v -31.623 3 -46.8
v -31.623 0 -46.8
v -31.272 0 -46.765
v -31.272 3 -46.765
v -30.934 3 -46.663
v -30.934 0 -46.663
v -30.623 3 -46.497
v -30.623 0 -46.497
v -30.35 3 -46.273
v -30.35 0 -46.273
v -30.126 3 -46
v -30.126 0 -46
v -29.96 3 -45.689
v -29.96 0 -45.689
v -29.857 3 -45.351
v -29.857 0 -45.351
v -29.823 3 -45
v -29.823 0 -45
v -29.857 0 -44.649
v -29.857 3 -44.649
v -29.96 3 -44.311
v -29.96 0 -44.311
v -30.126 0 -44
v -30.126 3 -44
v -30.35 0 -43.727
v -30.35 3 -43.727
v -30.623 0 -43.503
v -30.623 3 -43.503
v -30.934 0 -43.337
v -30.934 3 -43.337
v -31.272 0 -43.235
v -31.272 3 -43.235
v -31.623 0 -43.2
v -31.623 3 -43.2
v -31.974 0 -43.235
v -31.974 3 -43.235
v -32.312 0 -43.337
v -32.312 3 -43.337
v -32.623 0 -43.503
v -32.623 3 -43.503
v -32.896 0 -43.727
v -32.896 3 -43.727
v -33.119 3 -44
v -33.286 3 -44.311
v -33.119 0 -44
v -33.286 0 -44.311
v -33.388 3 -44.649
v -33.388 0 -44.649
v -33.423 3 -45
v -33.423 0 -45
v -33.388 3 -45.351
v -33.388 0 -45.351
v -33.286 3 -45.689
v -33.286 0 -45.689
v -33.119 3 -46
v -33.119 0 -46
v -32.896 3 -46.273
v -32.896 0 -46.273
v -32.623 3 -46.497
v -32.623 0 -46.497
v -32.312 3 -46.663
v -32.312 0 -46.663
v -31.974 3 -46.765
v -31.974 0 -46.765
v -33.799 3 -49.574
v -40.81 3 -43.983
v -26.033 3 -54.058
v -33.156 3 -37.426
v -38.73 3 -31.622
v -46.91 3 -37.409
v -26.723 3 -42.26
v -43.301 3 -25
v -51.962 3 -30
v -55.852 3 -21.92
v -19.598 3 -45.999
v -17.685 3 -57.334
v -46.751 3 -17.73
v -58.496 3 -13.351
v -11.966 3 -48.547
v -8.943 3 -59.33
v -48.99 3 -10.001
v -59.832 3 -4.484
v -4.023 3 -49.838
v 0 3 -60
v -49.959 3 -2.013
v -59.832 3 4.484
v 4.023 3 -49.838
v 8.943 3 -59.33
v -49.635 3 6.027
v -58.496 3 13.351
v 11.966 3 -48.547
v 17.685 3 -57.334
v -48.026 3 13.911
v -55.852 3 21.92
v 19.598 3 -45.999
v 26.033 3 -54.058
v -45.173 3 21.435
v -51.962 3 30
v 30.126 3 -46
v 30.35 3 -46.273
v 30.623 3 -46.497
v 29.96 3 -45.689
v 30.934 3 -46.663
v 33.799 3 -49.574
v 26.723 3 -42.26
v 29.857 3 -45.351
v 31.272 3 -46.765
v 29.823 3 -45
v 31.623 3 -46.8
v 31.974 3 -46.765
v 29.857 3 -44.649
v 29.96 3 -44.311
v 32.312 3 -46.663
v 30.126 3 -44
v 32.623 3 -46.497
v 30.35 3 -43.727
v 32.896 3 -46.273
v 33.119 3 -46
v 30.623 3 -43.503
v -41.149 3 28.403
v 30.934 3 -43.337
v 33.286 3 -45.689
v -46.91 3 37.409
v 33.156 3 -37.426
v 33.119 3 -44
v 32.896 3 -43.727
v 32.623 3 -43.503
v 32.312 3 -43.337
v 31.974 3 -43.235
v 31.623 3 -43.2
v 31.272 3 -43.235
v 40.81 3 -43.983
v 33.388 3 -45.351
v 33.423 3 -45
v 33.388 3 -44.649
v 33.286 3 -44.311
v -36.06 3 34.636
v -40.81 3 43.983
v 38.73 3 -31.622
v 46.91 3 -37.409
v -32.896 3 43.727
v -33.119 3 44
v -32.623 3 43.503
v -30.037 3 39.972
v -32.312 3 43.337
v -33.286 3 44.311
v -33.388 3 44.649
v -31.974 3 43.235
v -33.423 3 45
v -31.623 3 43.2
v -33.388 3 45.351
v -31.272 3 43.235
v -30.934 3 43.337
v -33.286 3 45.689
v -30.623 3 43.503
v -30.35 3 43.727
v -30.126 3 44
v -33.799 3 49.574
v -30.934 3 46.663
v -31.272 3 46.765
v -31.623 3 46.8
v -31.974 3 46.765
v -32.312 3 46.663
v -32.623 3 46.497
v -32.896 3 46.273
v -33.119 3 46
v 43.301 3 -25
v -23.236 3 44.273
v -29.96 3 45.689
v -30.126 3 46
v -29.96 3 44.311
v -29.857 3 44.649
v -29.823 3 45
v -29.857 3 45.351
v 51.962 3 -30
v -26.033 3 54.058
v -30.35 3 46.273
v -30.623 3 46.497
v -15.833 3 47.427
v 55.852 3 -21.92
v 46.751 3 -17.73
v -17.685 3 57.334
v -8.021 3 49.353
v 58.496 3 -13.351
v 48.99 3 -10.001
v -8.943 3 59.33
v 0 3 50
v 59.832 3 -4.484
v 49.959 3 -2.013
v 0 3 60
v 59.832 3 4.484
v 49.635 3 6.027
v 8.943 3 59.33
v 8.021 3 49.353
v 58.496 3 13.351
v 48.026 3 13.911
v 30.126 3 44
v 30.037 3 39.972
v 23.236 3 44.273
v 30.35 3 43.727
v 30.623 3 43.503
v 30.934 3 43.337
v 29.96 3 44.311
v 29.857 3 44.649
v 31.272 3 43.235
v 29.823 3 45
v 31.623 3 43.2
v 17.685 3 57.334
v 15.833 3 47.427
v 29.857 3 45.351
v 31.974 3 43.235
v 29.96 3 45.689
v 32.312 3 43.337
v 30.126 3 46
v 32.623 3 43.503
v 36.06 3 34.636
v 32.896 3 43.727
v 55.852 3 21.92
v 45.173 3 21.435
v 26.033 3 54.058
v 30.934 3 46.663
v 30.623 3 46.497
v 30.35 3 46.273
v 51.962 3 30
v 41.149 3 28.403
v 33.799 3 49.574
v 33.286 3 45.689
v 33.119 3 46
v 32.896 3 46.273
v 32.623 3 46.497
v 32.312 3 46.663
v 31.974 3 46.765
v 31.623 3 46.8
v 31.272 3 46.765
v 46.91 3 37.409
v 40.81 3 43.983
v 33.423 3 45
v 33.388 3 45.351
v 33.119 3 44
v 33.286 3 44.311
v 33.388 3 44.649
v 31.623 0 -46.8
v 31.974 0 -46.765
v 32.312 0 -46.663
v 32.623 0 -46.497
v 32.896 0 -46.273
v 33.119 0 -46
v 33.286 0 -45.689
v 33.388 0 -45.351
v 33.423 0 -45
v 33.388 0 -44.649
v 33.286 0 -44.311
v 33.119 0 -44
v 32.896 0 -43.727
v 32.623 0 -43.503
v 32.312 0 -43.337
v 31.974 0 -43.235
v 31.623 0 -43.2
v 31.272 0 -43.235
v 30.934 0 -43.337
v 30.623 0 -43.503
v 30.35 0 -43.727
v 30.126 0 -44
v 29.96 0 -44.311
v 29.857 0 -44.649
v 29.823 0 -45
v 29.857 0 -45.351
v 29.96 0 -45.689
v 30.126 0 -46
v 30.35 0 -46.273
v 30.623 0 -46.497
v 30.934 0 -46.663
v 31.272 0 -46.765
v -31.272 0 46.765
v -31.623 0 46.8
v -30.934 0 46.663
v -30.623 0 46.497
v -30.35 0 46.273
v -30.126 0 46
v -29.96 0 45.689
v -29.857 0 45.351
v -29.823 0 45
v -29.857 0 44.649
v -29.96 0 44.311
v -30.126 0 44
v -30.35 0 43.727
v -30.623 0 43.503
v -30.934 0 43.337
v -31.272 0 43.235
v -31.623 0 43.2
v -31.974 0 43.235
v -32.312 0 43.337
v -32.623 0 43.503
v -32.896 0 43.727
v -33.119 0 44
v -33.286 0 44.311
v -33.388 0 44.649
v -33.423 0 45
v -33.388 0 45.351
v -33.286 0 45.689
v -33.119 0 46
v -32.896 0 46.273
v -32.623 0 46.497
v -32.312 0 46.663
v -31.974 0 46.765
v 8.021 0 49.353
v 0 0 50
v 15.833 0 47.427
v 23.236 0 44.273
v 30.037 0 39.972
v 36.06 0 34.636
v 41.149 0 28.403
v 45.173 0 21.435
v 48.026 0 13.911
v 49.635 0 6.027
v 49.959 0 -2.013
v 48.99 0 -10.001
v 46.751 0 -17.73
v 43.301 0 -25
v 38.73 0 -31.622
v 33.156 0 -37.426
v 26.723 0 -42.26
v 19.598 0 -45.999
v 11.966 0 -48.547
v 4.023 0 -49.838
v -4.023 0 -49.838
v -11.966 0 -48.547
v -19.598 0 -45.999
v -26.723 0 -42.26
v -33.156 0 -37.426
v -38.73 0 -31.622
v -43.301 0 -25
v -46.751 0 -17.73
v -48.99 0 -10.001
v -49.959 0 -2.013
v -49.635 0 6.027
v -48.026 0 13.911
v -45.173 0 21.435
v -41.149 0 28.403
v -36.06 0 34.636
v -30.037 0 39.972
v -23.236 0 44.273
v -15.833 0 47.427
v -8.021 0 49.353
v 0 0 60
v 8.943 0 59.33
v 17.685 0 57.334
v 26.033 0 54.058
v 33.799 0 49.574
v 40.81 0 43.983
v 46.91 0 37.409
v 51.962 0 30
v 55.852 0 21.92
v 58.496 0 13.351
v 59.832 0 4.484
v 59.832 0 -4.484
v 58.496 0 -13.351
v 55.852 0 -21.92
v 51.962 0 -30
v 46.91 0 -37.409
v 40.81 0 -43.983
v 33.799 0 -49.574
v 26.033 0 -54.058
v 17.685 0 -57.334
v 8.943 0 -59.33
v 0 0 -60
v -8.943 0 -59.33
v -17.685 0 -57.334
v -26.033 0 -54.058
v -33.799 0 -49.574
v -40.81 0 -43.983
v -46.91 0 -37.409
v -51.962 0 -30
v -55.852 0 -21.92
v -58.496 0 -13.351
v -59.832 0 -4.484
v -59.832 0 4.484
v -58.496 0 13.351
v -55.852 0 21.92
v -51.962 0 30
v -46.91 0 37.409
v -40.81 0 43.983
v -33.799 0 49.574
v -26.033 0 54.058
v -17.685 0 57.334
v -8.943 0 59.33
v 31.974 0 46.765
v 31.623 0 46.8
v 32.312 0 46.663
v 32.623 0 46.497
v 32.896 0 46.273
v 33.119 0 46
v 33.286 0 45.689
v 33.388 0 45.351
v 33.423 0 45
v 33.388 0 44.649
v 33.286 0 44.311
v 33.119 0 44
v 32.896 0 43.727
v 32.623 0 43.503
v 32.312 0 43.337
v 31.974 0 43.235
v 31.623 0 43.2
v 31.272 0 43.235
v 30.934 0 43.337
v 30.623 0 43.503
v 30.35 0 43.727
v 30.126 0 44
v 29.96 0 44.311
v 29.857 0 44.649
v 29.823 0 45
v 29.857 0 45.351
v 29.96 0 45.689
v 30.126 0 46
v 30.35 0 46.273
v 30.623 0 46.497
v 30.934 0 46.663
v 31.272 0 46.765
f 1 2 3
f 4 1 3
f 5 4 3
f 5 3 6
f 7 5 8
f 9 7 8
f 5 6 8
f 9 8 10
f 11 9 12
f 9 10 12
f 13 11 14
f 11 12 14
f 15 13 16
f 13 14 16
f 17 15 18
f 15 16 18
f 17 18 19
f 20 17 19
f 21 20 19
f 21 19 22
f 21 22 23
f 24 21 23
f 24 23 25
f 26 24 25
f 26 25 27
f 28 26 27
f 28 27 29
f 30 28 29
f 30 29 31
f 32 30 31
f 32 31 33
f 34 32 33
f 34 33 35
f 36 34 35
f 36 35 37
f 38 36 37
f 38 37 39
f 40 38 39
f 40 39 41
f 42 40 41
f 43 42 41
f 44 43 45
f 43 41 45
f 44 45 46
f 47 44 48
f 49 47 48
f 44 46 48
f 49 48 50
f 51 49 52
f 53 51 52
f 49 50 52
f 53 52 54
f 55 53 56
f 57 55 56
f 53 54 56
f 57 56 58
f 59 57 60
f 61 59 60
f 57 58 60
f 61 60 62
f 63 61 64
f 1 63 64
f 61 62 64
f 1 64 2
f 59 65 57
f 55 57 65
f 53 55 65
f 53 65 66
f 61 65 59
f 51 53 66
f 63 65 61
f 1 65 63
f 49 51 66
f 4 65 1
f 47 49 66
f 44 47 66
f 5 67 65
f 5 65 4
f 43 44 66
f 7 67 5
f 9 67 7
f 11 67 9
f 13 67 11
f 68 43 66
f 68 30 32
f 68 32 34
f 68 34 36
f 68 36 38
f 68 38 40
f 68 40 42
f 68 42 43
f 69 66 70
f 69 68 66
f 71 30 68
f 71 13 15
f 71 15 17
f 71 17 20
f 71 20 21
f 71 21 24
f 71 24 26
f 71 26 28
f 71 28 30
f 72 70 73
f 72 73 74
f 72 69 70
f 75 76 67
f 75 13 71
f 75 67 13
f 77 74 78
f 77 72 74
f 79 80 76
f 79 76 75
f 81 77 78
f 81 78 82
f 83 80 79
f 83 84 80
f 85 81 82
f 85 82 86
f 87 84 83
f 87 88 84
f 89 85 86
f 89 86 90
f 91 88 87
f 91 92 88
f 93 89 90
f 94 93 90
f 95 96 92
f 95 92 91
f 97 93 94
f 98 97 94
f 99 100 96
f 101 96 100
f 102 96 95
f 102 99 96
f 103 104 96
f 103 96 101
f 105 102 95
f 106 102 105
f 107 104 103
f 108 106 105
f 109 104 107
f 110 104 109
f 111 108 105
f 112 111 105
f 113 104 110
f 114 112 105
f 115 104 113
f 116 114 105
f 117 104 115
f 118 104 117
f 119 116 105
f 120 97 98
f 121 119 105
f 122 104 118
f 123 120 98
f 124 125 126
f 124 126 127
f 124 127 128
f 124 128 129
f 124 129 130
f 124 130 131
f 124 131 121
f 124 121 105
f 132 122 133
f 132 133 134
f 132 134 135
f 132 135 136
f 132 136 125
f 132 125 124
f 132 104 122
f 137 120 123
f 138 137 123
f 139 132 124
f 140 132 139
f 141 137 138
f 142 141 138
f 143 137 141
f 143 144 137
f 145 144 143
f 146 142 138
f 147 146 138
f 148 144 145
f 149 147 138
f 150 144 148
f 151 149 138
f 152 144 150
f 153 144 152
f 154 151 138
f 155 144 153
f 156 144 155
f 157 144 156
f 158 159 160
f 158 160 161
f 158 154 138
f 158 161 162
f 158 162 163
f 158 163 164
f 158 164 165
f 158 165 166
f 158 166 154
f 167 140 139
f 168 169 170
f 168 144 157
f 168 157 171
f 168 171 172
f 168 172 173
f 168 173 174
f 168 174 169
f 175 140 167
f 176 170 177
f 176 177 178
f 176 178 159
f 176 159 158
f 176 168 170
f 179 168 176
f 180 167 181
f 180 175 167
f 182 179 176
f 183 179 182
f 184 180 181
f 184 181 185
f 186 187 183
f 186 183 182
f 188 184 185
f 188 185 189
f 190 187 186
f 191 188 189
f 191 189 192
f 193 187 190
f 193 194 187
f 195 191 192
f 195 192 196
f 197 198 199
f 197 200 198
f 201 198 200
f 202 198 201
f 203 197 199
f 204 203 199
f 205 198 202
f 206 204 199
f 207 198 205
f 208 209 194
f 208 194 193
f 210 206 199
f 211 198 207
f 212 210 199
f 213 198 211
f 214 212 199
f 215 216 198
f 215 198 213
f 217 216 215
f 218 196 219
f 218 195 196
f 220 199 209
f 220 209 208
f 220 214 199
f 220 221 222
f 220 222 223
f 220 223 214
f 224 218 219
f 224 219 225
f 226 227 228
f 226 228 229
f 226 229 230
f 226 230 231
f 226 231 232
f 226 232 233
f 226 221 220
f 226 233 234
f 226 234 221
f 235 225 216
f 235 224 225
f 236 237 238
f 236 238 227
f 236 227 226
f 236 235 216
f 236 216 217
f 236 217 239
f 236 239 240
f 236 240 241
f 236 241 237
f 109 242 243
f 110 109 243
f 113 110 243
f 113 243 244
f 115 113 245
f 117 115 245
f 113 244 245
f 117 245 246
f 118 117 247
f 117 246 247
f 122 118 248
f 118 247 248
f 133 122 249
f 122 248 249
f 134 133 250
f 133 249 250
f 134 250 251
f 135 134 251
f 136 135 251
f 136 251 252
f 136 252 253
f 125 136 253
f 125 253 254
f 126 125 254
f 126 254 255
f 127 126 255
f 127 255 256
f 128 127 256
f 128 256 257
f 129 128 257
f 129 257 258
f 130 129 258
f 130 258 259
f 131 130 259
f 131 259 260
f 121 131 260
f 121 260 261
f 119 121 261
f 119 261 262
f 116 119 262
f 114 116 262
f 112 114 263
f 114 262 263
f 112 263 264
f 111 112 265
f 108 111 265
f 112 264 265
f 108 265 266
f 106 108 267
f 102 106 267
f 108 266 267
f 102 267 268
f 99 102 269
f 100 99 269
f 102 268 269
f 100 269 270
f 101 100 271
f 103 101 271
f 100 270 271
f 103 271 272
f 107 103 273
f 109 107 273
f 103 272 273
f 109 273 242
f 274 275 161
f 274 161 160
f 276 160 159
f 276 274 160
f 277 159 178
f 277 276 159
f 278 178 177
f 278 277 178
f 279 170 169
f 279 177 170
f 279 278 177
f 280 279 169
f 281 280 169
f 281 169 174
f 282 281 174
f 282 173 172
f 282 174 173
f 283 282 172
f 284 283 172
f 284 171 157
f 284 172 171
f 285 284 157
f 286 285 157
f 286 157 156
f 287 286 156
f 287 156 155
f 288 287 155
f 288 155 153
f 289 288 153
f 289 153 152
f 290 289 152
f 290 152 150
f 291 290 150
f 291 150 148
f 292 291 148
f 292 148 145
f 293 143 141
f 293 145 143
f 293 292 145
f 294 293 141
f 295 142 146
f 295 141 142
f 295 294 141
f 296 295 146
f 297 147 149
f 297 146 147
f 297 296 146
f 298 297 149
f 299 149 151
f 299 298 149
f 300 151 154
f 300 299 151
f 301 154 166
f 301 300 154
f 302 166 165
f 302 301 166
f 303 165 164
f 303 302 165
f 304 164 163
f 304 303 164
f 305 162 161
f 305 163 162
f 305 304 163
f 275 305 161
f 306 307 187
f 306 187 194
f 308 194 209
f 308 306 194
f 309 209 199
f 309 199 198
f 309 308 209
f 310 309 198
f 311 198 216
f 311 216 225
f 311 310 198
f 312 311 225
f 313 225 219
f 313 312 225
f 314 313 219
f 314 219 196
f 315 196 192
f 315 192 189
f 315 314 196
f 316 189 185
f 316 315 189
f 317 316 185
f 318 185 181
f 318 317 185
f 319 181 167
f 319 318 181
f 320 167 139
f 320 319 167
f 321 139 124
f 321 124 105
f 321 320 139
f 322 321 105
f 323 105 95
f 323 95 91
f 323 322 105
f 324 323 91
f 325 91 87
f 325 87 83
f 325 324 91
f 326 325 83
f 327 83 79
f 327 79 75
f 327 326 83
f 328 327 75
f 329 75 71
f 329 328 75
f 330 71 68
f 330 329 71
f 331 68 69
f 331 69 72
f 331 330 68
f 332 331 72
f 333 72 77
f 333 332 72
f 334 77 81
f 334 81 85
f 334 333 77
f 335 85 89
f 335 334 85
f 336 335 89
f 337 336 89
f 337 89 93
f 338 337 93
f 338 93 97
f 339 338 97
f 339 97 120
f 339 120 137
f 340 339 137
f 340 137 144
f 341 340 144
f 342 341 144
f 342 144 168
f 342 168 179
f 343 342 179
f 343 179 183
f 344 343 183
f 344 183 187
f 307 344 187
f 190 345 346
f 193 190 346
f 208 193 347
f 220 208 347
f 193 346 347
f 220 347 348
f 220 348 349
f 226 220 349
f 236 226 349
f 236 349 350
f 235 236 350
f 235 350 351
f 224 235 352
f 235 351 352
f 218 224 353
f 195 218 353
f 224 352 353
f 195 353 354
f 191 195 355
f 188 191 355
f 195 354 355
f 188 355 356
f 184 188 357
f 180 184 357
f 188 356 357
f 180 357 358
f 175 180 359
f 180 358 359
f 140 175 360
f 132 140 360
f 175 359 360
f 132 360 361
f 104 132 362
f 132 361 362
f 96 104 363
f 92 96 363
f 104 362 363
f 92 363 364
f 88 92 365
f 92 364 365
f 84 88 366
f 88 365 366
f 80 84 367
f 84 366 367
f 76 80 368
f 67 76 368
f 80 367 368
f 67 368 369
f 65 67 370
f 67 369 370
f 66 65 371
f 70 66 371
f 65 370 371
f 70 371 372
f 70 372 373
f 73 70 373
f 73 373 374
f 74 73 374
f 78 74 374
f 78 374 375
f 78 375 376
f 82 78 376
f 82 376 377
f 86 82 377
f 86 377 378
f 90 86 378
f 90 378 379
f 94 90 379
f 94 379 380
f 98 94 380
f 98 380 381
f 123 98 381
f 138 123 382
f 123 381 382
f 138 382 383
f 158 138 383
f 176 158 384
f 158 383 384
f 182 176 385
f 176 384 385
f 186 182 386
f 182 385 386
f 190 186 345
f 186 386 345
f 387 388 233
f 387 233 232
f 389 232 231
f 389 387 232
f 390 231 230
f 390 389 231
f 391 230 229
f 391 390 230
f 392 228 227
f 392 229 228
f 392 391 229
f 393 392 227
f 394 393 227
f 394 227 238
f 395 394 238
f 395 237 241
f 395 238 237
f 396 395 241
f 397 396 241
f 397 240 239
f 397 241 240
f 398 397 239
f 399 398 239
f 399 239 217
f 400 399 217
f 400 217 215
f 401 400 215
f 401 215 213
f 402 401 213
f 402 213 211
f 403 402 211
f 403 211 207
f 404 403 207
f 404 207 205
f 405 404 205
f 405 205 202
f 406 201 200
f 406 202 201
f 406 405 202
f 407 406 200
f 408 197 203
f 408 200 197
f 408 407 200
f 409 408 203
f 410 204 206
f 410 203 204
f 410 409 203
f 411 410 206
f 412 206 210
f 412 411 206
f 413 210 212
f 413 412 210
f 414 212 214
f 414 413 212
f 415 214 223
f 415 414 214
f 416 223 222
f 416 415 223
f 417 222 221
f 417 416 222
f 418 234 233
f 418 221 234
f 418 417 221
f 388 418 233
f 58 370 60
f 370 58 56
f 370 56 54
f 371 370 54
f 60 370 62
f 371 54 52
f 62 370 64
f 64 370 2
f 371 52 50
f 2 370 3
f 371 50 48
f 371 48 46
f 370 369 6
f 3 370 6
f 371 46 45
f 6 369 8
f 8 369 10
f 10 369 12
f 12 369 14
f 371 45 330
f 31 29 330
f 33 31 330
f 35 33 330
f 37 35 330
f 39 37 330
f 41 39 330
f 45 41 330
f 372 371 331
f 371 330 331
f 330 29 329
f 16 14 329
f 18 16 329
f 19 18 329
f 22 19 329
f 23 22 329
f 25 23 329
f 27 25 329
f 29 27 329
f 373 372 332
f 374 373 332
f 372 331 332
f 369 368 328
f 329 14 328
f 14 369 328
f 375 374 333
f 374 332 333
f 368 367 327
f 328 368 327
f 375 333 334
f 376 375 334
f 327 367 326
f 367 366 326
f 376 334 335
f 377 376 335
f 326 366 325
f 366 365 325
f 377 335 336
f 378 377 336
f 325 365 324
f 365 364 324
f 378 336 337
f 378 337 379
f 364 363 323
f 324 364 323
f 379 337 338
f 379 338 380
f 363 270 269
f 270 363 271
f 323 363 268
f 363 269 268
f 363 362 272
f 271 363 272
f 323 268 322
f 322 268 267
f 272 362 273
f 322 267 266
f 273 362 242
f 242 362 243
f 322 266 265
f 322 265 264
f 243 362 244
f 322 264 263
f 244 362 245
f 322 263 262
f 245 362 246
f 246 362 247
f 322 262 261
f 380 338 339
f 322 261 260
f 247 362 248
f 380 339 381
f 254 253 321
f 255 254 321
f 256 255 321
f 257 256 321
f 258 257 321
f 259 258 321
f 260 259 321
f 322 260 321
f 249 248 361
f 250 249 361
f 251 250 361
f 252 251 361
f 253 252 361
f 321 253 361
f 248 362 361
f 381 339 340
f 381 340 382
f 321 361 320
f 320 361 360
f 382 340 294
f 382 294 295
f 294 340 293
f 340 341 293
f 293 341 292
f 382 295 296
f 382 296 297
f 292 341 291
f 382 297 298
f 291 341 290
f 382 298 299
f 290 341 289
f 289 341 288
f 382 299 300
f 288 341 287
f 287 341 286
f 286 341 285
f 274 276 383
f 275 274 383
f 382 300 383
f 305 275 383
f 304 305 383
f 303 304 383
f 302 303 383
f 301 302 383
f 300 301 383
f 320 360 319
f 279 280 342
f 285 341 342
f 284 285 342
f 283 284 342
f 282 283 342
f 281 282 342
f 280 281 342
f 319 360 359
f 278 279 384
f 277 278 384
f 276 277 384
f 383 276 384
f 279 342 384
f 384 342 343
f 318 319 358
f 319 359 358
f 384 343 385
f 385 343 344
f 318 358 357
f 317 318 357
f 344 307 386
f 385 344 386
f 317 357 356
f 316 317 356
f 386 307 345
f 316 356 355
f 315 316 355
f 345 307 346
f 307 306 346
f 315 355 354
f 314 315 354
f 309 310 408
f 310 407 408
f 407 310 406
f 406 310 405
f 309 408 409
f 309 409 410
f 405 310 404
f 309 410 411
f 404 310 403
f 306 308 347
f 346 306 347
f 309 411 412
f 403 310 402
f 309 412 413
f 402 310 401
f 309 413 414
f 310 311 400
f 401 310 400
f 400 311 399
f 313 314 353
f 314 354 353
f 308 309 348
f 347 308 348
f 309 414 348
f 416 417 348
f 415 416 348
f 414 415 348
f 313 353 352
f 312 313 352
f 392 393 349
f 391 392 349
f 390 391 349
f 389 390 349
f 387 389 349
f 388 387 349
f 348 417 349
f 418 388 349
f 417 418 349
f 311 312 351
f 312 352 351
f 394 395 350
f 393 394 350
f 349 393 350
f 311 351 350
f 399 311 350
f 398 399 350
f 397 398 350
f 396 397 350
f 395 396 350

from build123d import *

# Parameters (mm, degrees)
SKETCH_2_R      = 60
SKETCH_2_R_2    = 50
EXTRUDE_2_DEPTH = 3
M3_HUB_BOARD_D  = 3.6


with BuildPart() as part:
    # ｽｹｯﾁ2 → ﾎﾞｽ - 押し出し2 (new body)
    with BuildSketch(Plane(origin=(0, 0, 0), x_dir=(1, 0, 0), z_dir=(0, 1, 0))):
        with Locations(Location((0, 0, 0), (0, 0, 270))):
            Circle(SKETCH_2_R)
        with Locations(Location((0, 0, 0), (0, 0, 270))):
            Circle(SKETCH_2_R_2, mode=Mode.SUBTRACT)
    extrude(amount=EXTRUDE_2_DEPTH)

    # M3 Hub_Boardへの固定用穴 (through all)
    with Locations(Plane(origin=(-31.622776602, 3, -45), x_dir=(0, 0, 1), z_dir=(0, 1, 0))):
        with Locations((0, 0), (0, 63.245553204)):
            m3_hub_board = Hole(M3_HUB_BOARD_D / 2)

    # ﾐﾗｰ1: M3 Hub_Boardへの固定用穴 across plane
    add(m3_hub_board.mirror(Plane.XY), mode=Mode.SUBTRACT)


solid = part.part
